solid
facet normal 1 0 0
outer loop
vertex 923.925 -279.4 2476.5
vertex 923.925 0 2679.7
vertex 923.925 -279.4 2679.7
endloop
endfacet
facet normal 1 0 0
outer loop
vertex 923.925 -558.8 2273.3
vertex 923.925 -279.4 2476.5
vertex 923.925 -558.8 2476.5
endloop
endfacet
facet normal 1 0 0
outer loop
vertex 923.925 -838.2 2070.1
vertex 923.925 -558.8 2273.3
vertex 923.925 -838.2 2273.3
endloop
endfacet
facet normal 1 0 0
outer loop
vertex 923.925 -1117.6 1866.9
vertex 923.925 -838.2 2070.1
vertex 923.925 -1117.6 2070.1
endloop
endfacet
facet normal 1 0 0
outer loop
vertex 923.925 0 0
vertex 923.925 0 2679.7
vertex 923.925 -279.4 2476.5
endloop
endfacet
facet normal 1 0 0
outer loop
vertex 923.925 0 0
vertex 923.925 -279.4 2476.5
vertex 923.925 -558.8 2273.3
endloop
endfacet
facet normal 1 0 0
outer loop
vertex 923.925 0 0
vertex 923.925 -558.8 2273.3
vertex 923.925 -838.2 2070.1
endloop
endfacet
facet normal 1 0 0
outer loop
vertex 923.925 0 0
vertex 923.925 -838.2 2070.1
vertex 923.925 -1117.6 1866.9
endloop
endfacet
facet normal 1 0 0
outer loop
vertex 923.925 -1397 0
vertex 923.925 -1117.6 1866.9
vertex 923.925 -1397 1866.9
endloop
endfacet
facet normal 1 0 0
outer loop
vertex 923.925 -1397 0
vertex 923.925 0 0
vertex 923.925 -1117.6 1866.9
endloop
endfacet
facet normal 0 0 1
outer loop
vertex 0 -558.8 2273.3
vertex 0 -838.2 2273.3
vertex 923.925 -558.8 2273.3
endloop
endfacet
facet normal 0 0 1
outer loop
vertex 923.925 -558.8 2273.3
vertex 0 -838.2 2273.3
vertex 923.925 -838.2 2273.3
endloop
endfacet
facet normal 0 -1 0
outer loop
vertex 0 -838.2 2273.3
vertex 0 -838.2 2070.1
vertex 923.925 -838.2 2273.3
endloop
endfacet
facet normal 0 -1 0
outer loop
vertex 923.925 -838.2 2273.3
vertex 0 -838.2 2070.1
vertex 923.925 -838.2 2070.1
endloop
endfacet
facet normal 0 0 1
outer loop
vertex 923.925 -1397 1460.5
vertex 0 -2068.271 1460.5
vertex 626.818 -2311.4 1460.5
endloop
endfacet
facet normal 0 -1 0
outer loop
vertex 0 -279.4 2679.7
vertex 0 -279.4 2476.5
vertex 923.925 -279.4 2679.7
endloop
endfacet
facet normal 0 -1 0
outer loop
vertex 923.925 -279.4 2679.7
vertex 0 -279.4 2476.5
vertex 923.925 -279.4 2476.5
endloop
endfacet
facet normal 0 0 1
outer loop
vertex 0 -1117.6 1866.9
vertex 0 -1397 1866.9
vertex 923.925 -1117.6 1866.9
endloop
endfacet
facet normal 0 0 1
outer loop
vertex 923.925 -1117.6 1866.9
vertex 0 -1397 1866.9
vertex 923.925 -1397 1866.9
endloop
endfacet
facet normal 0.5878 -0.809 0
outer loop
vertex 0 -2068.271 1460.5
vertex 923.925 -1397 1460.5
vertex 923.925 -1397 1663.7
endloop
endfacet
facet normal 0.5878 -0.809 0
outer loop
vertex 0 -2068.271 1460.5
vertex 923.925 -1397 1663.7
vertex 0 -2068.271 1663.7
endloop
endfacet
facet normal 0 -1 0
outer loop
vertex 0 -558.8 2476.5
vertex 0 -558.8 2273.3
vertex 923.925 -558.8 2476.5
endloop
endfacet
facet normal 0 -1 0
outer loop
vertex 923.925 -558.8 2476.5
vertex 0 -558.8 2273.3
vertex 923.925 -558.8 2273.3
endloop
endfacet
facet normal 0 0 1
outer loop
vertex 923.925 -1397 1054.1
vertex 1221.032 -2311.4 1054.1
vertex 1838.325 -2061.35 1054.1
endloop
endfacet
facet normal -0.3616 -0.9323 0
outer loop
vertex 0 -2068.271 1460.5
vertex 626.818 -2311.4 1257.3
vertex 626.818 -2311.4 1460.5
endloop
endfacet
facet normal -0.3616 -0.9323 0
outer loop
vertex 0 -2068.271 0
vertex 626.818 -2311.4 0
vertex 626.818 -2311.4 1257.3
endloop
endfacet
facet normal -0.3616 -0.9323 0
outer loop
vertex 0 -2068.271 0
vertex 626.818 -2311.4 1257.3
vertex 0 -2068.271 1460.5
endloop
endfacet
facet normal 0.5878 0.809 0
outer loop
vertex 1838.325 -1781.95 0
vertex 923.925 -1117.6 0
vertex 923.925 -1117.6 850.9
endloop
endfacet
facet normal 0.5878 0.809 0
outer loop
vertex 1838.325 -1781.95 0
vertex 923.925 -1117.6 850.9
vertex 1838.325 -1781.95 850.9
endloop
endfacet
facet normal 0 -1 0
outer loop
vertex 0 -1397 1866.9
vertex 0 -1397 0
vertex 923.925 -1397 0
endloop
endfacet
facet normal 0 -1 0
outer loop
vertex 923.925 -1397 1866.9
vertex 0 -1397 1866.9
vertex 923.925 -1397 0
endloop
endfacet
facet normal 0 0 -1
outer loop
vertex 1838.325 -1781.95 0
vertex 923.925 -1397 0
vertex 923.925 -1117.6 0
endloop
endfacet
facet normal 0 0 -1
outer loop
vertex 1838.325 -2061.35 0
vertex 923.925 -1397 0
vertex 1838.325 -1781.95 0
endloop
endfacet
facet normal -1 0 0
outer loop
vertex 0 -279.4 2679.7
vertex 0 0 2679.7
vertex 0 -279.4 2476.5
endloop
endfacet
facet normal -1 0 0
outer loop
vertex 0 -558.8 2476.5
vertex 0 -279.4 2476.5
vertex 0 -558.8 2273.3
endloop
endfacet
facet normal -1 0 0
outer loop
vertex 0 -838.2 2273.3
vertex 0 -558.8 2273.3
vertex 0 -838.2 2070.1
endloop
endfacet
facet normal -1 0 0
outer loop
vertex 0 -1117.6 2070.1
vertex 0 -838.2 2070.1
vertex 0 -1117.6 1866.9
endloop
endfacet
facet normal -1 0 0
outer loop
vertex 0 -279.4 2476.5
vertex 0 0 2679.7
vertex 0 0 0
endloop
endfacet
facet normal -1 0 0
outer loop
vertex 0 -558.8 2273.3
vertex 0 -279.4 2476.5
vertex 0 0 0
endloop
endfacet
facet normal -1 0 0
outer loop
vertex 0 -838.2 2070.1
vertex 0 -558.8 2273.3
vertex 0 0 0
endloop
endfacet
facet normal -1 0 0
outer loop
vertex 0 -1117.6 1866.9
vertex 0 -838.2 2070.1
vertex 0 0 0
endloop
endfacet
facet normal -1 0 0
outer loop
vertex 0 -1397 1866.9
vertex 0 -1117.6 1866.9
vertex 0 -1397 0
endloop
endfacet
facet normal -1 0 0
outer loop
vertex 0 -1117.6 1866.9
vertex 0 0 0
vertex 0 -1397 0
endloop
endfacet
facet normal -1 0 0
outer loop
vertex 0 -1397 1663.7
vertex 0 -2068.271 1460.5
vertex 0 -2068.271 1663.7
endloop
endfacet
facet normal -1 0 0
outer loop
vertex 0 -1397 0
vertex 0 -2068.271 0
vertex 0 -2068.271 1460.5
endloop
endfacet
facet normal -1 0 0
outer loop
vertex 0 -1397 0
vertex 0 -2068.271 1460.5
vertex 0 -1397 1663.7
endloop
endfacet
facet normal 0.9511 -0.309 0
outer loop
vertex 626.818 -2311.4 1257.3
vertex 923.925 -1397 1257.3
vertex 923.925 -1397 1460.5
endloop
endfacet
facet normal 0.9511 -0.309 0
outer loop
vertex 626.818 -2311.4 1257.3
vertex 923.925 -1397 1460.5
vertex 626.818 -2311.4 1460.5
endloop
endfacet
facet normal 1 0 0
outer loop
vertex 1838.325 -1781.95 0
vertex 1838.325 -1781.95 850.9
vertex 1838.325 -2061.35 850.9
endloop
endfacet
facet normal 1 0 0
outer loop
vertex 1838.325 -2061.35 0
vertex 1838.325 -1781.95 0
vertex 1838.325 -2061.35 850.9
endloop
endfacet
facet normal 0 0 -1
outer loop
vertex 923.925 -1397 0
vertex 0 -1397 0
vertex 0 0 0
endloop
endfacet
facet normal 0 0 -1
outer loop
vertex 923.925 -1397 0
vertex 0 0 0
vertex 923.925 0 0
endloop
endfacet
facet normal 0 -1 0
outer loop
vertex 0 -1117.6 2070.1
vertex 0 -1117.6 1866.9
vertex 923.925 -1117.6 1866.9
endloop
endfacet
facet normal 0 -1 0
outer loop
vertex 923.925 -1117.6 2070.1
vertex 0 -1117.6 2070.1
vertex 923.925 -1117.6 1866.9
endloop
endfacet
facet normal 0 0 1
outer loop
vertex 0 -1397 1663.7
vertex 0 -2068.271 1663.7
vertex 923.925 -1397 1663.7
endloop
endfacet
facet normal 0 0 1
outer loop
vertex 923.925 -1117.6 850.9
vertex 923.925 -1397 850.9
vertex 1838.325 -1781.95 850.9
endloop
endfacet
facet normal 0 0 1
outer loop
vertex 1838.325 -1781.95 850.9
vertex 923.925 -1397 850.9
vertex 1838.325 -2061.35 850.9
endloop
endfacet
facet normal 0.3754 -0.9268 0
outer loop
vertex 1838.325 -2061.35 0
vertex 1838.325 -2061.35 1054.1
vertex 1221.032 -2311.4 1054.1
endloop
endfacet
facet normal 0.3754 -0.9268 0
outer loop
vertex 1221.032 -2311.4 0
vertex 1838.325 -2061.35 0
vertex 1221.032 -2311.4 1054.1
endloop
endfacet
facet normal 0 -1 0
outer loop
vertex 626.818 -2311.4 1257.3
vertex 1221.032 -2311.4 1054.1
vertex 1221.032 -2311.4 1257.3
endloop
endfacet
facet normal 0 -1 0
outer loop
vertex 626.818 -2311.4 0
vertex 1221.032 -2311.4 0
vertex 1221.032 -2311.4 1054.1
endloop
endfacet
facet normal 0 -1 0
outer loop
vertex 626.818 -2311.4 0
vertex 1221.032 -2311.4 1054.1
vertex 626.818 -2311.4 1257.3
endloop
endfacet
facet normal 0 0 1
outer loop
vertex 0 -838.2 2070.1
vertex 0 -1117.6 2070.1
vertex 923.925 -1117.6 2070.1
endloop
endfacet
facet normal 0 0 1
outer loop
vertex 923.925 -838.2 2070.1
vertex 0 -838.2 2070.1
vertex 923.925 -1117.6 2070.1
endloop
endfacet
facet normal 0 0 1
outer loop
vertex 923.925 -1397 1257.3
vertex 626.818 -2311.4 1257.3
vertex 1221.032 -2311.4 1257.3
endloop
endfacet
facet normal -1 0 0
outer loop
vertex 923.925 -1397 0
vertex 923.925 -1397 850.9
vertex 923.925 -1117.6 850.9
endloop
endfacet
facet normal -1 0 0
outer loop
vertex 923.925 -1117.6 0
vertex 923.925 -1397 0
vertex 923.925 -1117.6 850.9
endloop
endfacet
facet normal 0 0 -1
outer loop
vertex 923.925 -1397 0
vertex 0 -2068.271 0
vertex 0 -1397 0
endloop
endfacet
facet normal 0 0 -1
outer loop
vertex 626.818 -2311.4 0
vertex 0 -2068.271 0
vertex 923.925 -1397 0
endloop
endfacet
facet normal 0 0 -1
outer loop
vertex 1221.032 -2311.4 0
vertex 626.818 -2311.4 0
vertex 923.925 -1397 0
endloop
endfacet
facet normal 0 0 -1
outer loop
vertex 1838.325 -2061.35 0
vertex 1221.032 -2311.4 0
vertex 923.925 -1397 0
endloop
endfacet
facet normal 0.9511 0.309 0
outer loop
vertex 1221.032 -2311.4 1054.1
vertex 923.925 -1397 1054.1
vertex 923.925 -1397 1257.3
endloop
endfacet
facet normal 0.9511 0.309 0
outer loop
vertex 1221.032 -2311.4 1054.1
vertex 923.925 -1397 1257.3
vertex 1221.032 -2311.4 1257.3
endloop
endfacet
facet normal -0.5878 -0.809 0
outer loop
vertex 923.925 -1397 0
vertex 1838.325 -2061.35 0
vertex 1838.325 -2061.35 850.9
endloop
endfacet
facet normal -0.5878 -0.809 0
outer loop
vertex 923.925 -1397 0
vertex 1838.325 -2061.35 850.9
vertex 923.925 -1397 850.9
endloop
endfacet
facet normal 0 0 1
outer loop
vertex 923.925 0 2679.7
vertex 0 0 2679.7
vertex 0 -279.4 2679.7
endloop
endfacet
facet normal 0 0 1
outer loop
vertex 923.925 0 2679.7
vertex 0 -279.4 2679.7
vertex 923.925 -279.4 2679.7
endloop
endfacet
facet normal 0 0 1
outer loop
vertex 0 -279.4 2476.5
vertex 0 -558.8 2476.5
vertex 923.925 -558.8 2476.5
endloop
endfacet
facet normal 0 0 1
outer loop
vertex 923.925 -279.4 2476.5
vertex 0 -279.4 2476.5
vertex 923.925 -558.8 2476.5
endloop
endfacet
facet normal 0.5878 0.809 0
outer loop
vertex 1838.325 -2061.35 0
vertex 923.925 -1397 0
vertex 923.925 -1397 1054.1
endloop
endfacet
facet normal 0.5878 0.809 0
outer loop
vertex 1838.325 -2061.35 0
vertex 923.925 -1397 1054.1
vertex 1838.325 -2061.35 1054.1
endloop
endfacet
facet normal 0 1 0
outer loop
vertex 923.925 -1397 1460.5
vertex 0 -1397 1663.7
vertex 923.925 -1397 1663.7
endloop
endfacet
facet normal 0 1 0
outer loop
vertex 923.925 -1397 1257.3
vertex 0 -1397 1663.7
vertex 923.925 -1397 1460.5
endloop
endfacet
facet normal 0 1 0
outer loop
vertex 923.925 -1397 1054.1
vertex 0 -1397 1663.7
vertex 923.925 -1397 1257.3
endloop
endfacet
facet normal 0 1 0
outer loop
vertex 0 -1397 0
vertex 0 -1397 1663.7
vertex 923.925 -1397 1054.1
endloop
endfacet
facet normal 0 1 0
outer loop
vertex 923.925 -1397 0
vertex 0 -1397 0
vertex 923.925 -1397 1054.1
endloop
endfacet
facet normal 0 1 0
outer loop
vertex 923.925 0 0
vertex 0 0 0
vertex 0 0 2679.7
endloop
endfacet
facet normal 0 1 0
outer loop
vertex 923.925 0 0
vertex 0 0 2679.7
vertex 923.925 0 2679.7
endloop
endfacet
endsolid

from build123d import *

# Parameters (mm, degrees)
F0_W      = 923.925
F0_H      = 279.4
F1_DEPTH  = 2679.7
F2_W      = 923.925
F2_H      = 279.4
F3_DEPTH  = 2476.5
F4_W      = 923.925
F4_H      = 279.4
F5_DEPTH  = 2273.3
F6_W      = 923.925
F6_H      = 279.4
F7_DEPTH  = 2070.1
F8_W      = 923.925
F8_H      = 279.4
F9_DEPTH  = 1866.9
F11_DEPTH = 1663.7
F13_DEPTH = 1460.5
F15_DEPTH = 1257.3
F18_DEPTH = 1054.1
F20_DEPTH = 850.9


with BuildPart() as f1:
    # F0 (on Top) → F1 (new body)
    with BuildSketch(Plane.XY):
        with Locations((461.9625, -139.7)):
            Rectangle(F0_W, F0_H)
    extrude(amount=F1_DEPTH)

    # F2 (on face) → F3 (join)
    with BuildSketch(Plane(origin=(0, 0, 0), x_dir=(1, 0, 0), z_dir=(0, 0, -1))):
        with Locations((461.9625, 419.1)):
            Rectangle(F2_W, F2_H)
    extrude(amount=-F3_DEPTH)

    # F4 (on face) → F5 (join)
    with BuildSketch(Plane(origin=(0, 0, 0), x_dir=(1, 0, 0), z_dir=(0, 0, -1))):
        with Locations((461.9625, 698.5)):
            Rectangle(F4_W, F4_H)
    extrude(amount=-F5_DEPTH)

    # F6 (on face) → F7 (join)
    with BuildSketch(Plane(origin=(0, 0, 0), x_dir=(1, 0, 0), z_dir=(0, 0, -1))):
        with Locations((461.9625, 977.9)):
            Rectangle(F6_W, F6_H)
    extrude(amount=-F7_DEPTH)

    # F8 (on face) → F9 (join)
    with BuildSketch(Plane(origin=(0, 0, 0), x_dir=(1, 0, 0), z_dir=(0, 0, -1))):
        with Locations((461.9625, 1257.3)):
            Rectangle(F8_W, F8_H)
    extrude(amount=-F9_DEPTH)


with BuildPart() as f11:
    # F10 (on face) → F11 (new body)
    with BuildSketch(Plane(origin=(0, 0, 0), x_dir=(1, 0, 0), z_dir=(0, 0, -1))):
        Polygon((0, 1397), (923.925, 1397), (0, 2068.2708051874), align=None)
    extrude(amount=-F11_DEPTH)

    # F12 (on face) → F13 (join)
    with BuildSketch(Plane(origin=(0, 0, 0), x_dir=(1, 0, 0), z_dir=(0, 0, -1))):
        Polygon((0, 2068.2708051874), (923.925, 1397), (626.8184297646, 2311.4), align=None)
    extrude(amount=-F13_DEPTH)

    # F14 (on face) → F15 (join)
    with BuildSketch(Plane(origin=(0, 0, 0), x_dir=(1, 0, 0), z_dir=(0, 0, -1))):
        Polygon((626.8184297646, 2311.4), (923.925, 1397), (1221.0315702354, 2311.4), align=None)
    extrude(amount=-F15_DEPTH)

    # F17 (on face) → F18 (join)
    with BuildSketch(Plane(origin=(0, 0, 0), x_dir=(1, 0, 0), z_dir=(0, 0, -1))):
        Polygon((1221.0315702354, 2311.4), (923.925, 1397), (1838.325, 2061.3504876081), align=None)
    extrude(amount=-F18_DEPTH)


with BuildPart() as f20:
    # F19 (on face) → F20 (new body)
    with BuildSketch(Plane(origin=(0, 0, 0), x_dir=(1, 0, 0), z_dir=(0, 0, -1))):
        Polygon((1838.325, 1781.9504876081), (1838.325, 2061.3504876081), (923.925, 1397), (923.925, 1117.6), align=None)
    extrude(amount=-F20_DEPTH)


solid = Compound([f1.part, f11.part, f20.part])
